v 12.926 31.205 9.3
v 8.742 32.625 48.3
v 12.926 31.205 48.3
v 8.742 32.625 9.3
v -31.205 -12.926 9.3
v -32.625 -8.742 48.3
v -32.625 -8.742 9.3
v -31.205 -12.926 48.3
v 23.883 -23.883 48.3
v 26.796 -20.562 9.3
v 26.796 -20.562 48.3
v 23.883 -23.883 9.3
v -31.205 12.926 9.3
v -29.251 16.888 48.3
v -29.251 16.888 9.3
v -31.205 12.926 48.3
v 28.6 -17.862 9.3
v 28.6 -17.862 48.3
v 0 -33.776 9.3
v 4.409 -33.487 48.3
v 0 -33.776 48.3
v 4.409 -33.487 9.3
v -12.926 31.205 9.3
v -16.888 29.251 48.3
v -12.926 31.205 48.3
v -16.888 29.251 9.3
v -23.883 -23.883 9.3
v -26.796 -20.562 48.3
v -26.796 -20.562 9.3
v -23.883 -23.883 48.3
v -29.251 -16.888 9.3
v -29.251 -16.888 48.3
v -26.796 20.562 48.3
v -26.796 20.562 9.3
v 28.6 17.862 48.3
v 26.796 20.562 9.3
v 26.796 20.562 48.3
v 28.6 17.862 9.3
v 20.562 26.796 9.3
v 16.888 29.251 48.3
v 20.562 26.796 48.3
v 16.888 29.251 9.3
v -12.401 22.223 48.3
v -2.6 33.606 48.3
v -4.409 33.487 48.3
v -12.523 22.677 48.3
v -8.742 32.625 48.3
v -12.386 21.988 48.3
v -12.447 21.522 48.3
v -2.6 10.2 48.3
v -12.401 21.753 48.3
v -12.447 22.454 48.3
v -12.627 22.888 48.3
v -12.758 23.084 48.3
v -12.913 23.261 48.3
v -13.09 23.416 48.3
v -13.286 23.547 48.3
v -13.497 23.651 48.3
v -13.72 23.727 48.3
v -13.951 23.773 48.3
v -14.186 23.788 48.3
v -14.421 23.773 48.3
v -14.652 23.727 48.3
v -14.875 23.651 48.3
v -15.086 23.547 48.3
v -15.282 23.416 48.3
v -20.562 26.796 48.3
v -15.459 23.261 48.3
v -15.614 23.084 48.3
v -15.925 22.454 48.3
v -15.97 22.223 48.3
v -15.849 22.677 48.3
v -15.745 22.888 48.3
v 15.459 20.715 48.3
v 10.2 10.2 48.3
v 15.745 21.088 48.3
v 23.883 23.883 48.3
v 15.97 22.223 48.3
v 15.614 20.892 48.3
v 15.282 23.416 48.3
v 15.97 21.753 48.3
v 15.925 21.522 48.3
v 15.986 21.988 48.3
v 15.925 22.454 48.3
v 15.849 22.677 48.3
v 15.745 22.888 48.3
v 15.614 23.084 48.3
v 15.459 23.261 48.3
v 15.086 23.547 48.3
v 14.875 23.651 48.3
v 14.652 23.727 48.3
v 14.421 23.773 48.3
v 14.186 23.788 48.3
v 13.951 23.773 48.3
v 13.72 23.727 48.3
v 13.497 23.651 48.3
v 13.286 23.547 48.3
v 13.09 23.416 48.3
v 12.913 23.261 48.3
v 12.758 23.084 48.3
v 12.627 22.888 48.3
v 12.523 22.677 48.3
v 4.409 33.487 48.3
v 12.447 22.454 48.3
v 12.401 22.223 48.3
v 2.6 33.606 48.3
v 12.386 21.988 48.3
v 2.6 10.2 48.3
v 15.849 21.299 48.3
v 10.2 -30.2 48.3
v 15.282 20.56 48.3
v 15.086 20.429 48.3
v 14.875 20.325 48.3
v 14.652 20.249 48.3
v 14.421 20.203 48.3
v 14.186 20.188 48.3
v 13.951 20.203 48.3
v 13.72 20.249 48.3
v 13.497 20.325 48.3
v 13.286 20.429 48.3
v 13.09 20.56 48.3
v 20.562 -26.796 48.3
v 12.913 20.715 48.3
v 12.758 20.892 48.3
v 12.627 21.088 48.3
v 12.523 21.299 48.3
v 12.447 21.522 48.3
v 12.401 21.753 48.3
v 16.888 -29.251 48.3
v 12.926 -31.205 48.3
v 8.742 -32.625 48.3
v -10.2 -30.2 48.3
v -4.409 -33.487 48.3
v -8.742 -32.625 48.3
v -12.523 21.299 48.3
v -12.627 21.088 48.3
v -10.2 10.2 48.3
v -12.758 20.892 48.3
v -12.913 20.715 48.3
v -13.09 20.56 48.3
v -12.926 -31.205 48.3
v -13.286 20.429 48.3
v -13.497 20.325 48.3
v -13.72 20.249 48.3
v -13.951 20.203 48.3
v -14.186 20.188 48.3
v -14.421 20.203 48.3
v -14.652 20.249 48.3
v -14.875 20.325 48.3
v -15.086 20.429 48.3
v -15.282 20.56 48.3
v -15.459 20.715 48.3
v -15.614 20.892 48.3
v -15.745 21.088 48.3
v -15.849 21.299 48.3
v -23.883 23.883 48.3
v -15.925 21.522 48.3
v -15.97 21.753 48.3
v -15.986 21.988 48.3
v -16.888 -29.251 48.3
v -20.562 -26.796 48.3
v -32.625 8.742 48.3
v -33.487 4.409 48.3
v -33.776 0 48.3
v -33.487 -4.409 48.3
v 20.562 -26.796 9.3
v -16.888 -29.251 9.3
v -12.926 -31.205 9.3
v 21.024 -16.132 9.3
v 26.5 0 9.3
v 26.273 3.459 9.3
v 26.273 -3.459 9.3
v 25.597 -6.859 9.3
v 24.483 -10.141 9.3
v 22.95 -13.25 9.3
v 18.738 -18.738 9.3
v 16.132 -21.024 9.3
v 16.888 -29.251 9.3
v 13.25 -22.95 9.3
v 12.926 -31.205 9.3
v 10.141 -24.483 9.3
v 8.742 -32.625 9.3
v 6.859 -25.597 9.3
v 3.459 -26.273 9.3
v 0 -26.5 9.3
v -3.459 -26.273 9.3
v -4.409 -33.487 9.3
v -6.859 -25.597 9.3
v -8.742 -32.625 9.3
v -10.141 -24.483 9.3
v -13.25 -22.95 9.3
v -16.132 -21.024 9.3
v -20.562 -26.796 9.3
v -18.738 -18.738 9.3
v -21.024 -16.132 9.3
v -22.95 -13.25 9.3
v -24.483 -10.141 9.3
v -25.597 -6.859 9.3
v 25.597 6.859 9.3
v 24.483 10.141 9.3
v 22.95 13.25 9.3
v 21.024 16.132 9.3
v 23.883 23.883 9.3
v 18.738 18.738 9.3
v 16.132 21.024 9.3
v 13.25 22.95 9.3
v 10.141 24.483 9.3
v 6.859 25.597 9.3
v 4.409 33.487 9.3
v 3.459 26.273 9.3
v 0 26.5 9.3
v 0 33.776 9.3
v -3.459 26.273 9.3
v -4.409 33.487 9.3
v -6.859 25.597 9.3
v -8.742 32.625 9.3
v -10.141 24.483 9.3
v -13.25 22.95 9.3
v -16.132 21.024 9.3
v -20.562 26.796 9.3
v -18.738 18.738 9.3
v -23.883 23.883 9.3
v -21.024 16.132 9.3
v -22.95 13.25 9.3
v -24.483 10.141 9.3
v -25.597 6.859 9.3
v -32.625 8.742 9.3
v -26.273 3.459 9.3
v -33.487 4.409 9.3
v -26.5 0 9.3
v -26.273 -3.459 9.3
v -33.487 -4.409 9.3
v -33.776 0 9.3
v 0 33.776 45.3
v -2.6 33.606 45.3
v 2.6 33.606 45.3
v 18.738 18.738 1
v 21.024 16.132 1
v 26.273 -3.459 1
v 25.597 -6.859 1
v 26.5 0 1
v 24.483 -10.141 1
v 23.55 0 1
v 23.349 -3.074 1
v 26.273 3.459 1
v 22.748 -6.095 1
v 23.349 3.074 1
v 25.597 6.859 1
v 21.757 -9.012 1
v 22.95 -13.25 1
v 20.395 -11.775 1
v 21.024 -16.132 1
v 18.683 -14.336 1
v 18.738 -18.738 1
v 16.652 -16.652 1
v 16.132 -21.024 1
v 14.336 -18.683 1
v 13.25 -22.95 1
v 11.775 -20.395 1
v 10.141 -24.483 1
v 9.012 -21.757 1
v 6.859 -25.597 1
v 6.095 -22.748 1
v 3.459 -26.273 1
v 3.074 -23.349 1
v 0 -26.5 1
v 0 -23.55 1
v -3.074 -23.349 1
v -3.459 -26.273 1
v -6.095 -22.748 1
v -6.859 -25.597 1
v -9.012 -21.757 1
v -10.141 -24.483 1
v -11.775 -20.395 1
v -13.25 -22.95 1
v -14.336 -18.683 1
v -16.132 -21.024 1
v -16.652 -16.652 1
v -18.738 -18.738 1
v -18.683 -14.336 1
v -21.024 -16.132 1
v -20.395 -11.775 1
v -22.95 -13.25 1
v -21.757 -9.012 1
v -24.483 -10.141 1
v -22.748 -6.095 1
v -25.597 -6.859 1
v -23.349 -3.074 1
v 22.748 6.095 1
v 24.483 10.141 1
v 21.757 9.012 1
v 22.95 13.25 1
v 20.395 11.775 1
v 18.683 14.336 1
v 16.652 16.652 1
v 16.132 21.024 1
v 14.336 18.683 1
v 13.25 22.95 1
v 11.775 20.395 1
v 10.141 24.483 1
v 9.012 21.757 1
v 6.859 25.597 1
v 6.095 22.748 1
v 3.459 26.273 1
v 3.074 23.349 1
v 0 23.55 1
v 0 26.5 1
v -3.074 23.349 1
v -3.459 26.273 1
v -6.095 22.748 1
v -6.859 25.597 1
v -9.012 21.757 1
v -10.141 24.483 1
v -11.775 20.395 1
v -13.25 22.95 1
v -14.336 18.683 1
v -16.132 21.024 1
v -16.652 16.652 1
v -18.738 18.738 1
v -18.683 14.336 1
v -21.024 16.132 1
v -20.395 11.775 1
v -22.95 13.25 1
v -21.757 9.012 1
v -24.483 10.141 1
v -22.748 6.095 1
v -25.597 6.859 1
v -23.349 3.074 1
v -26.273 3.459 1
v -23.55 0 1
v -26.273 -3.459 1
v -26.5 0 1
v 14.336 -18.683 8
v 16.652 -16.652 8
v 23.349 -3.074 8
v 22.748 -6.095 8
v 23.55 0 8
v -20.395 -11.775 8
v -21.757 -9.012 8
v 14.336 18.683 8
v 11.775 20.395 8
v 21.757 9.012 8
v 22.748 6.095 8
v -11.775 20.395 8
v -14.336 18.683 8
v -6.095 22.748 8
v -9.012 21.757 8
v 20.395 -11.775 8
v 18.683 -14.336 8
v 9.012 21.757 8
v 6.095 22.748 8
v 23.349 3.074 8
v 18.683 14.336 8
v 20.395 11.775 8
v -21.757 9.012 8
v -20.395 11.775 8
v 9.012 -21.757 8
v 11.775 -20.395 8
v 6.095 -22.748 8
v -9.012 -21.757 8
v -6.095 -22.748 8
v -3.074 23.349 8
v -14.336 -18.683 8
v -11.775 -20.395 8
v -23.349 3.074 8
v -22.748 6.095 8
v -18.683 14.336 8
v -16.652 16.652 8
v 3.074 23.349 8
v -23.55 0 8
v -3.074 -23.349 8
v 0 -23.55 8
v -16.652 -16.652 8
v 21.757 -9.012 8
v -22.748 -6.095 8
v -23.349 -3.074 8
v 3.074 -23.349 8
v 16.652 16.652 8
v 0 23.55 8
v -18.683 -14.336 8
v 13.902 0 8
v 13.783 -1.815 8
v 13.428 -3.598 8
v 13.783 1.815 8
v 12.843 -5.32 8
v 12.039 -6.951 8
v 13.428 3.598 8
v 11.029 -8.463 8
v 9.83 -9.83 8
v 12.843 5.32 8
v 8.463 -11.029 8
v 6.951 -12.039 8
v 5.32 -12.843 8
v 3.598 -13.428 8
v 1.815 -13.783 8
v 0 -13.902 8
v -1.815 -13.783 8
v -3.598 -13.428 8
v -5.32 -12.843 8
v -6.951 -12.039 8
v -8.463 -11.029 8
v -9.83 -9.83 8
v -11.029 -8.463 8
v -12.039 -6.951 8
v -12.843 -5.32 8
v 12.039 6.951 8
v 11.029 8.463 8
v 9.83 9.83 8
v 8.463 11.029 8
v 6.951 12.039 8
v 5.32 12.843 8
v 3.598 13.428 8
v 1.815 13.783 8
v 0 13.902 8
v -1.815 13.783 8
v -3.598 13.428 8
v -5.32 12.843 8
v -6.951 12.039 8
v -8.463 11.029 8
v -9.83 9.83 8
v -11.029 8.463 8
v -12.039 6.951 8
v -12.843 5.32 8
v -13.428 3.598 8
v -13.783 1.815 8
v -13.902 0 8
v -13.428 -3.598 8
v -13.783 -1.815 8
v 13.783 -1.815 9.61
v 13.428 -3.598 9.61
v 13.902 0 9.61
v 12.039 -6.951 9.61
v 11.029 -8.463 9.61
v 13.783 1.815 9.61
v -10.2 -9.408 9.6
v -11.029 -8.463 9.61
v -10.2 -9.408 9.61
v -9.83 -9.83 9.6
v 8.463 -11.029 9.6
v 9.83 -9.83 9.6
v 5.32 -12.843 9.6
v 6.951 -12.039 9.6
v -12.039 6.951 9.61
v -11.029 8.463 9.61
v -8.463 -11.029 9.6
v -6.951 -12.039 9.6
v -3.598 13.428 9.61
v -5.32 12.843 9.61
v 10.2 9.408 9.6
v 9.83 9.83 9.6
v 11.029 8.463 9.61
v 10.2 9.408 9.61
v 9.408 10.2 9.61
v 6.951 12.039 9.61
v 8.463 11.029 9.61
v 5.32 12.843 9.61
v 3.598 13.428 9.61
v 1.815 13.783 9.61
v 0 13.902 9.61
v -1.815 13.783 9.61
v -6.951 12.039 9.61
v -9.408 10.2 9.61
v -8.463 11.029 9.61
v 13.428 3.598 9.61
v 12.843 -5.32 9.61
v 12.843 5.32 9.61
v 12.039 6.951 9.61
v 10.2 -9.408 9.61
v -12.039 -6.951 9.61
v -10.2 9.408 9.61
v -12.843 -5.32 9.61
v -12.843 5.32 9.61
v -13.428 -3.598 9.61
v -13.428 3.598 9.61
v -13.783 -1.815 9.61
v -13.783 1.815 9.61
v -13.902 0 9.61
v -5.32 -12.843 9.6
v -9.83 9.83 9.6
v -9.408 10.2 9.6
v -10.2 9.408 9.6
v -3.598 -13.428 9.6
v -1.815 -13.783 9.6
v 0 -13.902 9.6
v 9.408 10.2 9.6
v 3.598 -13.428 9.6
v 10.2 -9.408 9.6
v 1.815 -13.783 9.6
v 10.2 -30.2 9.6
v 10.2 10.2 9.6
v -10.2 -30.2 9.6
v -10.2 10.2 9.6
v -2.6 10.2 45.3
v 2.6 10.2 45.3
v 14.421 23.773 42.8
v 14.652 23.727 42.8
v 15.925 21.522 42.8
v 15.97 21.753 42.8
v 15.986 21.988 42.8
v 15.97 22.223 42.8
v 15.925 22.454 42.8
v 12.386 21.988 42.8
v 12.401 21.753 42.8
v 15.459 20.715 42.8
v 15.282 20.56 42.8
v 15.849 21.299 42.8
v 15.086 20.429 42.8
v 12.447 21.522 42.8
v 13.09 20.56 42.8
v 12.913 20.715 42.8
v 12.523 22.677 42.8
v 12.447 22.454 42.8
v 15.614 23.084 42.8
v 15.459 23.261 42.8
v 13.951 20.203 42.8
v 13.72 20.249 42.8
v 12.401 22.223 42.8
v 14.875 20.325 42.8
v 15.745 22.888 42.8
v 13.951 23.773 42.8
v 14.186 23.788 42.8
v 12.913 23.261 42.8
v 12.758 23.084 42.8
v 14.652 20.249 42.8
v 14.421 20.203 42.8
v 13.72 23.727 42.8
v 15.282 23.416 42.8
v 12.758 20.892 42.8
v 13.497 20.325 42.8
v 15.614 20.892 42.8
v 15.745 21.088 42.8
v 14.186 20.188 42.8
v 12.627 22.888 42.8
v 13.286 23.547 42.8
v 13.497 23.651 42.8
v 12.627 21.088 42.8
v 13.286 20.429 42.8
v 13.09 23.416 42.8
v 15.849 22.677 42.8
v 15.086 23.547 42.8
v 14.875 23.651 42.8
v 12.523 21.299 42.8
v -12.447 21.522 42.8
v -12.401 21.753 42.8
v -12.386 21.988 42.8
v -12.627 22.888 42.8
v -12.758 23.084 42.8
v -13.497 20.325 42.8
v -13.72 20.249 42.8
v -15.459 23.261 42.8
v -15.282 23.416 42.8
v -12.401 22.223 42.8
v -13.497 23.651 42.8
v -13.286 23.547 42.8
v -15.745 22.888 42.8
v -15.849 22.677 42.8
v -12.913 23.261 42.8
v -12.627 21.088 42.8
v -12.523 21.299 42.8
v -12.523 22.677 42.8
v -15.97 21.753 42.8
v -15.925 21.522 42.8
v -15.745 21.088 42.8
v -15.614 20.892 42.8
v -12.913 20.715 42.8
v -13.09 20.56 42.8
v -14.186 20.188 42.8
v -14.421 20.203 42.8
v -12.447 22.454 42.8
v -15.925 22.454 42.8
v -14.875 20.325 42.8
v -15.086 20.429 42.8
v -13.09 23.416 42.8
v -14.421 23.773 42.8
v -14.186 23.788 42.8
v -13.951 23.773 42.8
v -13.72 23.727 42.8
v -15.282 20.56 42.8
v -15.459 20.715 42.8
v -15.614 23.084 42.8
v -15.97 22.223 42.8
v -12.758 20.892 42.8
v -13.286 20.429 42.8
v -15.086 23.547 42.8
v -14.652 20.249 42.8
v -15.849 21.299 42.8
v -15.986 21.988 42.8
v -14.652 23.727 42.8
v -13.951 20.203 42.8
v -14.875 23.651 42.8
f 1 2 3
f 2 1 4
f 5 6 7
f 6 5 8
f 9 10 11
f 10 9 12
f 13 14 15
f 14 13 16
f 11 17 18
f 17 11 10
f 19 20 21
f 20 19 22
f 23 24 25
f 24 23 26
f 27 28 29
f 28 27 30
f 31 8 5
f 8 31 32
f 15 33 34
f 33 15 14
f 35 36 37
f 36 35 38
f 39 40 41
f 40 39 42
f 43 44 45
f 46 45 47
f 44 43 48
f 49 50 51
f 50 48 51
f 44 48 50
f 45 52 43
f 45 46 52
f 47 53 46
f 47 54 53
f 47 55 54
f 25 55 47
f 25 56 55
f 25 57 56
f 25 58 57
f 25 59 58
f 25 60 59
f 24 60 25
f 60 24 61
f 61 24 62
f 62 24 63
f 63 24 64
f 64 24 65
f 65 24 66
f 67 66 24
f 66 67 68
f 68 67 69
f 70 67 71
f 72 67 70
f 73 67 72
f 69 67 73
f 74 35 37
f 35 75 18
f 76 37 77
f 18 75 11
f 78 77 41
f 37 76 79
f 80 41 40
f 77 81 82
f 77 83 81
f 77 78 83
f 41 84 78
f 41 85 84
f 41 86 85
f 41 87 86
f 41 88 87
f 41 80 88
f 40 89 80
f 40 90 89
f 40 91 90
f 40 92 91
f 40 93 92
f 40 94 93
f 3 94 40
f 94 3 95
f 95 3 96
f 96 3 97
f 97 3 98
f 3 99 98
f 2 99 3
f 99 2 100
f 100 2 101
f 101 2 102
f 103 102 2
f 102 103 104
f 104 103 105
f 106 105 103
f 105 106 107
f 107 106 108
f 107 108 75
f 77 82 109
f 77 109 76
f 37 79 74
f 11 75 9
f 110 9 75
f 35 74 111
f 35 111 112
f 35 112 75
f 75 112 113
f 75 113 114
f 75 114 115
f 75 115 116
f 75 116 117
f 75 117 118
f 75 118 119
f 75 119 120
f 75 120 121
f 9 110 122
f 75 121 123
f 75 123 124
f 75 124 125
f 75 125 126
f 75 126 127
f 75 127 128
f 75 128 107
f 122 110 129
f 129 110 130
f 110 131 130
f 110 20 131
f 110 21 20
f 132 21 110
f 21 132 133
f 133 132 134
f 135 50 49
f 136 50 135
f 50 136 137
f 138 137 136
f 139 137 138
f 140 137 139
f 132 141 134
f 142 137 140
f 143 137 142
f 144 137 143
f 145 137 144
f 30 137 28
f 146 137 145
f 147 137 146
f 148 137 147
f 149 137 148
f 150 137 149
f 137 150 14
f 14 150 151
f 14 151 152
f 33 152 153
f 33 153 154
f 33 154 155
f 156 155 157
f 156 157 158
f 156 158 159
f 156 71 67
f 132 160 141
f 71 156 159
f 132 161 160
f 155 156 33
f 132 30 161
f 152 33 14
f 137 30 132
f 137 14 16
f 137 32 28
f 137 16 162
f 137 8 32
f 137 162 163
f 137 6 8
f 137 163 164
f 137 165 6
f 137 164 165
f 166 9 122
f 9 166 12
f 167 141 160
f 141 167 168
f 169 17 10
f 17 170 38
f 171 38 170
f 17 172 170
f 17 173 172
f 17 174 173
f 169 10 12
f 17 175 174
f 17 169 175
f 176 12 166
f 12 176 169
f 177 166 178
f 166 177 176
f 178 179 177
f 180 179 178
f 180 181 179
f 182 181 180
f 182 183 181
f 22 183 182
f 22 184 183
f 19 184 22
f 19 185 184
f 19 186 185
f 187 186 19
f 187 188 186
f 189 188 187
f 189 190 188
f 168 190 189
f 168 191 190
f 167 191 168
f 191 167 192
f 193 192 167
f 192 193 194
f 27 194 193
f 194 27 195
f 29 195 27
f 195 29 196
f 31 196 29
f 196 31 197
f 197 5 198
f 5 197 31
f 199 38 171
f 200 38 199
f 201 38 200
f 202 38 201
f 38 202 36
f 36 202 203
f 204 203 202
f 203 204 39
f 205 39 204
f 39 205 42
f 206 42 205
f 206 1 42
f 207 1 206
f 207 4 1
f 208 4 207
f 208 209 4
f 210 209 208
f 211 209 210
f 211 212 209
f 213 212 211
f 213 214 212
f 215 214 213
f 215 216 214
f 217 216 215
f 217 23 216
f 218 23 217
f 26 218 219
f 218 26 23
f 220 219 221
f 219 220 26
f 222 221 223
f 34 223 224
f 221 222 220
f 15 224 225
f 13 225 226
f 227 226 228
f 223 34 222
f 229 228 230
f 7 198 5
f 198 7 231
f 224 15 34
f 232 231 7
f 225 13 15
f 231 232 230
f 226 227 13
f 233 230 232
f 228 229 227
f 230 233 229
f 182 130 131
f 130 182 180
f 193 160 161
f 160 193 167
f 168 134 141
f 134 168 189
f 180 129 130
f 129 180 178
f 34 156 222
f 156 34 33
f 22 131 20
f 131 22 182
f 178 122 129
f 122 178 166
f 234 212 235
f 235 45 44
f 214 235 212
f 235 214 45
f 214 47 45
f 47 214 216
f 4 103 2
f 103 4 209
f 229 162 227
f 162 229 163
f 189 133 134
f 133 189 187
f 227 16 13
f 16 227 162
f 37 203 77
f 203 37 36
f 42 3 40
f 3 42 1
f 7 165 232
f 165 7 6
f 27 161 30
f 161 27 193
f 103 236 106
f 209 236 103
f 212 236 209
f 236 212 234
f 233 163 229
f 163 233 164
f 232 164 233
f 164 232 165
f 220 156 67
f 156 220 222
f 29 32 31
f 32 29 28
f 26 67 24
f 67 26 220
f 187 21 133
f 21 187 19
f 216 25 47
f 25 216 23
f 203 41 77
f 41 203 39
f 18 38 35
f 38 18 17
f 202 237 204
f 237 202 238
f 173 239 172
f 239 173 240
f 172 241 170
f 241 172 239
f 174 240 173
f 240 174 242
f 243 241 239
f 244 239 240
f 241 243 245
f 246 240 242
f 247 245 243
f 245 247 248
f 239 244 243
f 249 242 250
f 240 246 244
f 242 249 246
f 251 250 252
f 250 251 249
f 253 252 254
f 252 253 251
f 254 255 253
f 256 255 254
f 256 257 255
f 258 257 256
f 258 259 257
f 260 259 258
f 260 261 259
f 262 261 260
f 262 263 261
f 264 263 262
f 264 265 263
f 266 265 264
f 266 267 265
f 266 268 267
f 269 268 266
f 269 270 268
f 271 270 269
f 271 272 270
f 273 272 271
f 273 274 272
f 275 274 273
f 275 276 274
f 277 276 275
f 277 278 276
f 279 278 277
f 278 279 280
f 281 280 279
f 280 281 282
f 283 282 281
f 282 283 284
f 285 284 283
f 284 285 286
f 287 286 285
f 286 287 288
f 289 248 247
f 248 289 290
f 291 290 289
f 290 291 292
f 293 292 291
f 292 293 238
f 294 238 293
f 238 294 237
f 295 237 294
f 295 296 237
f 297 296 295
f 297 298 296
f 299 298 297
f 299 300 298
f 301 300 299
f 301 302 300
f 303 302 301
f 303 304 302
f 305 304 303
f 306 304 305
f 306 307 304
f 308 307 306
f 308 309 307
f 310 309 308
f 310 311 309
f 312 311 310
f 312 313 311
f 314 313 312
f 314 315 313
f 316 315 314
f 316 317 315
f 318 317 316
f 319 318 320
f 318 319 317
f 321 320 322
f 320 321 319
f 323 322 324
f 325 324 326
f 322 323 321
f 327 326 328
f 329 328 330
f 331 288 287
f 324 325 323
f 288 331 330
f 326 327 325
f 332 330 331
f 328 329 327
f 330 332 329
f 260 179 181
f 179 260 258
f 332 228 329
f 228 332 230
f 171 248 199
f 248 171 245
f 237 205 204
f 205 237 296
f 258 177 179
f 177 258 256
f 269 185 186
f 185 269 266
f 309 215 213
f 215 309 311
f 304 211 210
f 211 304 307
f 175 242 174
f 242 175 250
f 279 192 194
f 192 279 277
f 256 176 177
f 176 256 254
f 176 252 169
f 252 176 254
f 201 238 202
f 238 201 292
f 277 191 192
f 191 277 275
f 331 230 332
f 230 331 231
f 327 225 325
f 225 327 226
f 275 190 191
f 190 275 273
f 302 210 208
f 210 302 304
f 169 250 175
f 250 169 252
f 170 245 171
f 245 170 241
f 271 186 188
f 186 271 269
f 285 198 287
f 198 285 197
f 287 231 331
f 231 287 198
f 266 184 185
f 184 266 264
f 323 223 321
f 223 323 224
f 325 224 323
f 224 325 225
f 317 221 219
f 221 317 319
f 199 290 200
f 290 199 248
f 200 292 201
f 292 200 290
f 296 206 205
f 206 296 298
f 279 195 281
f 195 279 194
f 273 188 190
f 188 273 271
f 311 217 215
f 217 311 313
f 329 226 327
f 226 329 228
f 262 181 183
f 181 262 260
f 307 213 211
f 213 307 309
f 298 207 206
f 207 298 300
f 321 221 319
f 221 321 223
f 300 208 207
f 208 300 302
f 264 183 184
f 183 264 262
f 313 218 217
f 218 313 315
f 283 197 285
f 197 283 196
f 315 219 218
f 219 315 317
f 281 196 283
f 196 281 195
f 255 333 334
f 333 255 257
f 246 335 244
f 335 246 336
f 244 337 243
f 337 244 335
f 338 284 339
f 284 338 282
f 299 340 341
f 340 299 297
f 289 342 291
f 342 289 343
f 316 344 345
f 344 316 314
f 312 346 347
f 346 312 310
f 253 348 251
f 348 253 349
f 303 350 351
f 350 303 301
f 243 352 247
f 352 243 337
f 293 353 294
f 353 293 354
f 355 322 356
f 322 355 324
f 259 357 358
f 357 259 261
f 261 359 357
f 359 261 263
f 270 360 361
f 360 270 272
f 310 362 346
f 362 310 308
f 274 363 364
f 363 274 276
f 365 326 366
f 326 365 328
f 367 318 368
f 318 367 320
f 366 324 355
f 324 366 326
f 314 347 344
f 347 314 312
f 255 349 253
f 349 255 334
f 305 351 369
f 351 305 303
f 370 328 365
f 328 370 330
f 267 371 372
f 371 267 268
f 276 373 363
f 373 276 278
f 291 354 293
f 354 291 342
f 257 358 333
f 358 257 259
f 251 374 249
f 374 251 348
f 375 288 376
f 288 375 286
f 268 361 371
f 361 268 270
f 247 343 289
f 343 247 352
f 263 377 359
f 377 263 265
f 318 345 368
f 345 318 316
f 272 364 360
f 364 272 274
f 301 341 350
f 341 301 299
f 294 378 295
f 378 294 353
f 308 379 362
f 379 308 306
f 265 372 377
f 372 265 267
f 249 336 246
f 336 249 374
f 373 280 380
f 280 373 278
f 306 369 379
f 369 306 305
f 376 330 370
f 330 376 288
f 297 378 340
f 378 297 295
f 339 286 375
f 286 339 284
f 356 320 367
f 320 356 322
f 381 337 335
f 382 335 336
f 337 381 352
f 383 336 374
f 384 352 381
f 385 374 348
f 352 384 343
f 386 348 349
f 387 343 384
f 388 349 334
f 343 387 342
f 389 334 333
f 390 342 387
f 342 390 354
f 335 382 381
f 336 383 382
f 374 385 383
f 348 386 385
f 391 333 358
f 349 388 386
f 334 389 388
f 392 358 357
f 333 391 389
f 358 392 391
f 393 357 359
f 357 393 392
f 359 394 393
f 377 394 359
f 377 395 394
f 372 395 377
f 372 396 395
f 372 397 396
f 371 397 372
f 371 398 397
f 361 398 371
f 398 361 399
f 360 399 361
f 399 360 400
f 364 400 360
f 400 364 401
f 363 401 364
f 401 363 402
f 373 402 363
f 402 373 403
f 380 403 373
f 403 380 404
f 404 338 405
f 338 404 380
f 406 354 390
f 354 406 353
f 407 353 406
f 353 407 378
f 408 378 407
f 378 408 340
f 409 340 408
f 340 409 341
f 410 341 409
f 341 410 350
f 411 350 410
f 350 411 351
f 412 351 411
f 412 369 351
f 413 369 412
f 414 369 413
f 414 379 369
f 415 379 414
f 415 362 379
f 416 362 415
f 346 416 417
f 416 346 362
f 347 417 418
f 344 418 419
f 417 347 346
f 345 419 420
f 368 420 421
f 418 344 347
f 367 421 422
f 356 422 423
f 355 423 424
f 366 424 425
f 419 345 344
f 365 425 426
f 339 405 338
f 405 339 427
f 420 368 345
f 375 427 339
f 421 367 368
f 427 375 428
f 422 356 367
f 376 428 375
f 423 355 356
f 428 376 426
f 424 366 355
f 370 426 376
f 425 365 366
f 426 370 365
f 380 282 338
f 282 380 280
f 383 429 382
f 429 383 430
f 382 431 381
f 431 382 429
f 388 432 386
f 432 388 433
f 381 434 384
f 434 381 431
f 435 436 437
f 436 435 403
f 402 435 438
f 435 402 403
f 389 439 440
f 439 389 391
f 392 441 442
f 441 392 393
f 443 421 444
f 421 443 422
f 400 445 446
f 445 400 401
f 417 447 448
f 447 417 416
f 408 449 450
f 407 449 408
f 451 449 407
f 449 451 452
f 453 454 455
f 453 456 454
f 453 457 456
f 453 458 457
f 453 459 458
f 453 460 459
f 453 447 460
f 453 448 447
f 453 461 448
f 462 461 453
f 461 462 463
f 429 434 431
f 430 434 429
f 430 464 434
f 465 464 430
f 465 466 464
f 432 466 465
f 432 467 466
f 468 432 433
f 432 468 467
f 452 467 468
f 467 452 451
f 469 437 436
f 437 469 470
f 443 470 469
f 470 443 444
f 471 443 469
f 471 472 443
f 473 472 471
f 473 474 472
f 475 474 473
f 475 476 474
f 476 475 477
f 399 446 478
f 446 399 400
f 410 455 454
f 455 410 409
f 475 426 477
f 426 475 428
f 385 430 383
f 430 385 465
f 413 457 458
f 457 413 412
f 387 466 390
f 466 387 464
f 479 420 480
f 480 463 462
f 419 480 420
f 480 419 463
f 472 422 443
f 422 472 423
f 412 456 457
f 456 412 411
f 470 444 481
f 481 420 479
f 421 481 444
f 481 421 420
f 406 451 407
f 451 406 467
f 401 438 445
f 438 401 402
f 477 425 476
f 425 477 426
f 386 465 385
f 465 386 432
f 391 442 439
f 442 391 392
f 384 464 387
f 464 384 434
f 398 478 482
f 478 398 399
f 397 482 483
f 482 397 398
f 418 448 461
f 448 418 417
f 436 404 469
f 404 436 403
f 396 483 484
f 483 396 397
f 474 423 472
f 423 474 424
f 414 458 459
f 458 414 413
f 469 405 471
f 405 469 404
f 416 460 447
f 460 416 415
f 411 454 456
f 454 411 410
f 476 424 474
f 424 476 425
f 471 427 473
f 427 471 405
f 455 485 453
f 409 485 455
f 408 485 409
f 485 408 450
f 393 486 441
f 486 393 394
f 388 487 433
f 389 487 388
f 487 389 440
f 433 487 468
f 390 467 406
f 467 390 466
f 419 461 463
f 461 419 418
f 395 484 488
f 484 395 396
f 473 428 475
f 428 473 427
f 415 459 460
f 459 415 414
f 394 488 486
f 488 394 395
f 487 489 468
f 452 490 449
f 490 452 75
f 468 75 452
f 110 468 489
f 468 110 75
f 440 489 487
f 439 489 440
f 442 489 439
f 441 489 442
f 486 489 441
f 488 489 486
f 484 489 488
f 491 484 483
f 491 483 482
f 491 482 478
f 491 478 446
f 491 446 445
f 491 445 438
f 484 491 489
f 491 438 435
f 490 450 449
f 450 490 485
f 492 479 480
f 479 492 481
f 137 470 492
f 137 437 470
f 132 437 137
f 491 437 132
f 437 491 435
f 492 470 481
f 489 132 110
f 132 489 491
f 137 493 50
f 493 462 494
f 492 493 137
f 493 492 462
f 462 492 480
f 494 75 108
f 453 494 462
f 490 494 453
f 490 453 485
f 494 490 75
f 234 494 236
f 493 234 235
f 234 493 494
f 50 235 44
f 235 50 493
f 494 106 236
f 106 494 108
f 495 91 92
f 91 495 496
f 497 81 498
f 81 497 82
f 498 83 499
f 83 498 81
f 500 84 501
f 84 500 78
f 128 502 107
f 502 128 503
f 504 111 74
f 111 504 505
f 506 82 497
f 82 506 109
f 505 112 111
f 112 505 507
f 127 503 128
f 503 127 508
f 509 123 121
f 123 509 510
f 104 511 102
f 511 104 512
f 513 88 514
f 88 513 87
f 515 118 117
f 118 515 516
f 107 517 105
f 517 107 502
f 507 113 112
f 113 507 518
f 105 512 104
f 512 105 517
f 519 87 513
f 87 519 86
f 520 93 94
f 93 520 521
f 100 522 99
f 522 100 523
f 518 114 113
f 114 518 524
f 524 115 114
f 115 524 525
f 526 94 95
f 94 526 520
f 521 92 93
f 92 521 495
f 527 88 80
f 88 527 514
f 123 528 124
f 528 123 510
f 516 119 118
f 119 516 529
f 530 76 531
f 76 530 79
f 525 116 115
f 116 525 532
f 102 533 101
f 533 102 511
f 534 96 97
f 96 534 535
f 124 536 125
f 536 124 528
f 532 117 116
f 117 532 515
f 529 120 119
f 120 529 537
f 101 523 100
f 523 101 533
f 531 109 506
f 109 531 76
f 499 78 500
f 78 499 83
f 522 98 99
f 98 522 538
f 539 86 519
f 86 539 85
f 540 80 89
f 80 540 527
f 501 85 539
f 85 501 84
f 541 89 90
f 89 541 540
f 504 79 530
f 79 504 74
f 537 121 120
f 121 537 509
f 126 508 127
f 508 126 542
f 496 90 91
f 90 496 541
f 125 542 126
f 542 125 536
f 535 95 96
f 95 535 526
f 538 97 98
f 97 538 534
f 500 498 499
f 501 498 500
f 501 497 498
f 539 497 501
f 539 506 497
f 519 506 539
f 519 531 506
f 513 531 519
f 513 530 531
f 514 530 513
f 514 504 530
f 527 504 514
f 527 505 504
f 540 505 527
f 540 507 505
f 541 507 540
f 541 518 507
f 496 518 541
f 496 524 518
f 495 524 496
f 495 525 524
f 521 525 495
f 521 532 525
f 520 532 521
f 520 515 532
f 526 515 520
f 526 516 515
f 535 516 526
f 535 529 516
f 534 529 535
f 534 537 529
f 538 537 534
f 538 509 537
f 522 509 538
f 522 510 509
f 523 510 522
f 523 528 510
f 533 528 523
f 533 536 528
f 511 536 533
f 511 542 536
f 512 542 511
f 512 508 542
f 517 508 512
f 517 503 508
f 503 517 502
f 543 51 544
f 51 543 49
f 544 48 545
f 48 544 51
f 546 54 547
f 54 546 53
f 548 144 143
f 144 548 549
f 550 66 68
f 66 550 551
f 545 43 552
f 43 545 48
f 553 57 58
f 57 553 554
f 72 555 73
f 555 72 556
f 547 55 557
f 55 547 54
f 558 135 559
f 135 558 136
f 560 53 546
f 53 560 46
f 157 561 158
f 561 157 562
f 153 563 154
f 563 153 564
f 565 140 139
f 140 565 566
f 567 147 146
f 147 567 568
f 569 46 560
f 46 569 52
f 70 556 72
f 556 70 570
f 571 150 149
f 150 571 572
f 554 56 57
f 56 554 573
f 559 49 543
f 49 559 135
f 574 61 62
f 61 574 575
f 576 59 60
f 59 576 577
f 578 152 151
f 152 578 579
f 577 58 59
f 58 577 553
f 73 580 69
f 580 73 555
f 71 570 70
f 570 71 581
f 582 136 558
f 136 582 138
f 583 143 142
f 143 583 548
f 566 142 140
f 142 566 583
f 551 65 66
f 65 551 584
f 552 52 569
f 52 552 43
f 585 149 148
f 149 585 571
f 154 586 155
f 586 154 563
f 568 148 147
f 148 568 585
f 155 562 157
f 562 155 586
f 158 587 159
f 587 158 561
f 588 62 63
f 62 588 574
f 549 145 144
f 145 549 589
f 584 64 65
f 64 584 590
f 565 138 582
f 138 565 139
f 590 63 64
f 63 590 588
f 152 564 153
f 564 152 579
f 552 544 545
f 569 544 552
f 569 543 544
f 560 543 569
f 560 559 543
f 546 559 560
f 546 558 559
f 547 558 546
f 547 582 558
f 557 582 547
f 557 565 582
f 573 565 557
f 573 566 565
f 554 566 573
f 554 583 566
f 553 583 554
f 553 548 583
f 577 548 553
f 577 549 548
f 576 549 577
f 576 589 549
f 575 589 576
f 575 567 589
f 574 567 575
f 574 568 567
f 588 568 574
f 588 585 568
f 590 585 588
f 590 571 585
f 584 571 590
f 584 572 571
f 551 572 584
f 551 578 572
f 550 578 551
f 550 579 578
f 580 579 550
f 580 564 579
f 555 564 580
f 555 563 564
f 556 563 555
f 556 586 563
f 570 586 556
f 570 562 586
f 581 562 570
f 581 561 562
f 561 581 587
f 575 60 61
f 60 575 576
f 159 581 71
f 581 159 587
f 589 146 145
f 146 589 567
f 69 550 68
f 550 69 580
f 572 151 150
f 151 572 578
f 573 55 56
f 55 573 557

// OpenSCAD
// right cartridge_roll: press F6 (render) then File > Export > STL
include <../lib/g1_servo_arm.scad>
side = "right";
part = "cartridge_roll";
